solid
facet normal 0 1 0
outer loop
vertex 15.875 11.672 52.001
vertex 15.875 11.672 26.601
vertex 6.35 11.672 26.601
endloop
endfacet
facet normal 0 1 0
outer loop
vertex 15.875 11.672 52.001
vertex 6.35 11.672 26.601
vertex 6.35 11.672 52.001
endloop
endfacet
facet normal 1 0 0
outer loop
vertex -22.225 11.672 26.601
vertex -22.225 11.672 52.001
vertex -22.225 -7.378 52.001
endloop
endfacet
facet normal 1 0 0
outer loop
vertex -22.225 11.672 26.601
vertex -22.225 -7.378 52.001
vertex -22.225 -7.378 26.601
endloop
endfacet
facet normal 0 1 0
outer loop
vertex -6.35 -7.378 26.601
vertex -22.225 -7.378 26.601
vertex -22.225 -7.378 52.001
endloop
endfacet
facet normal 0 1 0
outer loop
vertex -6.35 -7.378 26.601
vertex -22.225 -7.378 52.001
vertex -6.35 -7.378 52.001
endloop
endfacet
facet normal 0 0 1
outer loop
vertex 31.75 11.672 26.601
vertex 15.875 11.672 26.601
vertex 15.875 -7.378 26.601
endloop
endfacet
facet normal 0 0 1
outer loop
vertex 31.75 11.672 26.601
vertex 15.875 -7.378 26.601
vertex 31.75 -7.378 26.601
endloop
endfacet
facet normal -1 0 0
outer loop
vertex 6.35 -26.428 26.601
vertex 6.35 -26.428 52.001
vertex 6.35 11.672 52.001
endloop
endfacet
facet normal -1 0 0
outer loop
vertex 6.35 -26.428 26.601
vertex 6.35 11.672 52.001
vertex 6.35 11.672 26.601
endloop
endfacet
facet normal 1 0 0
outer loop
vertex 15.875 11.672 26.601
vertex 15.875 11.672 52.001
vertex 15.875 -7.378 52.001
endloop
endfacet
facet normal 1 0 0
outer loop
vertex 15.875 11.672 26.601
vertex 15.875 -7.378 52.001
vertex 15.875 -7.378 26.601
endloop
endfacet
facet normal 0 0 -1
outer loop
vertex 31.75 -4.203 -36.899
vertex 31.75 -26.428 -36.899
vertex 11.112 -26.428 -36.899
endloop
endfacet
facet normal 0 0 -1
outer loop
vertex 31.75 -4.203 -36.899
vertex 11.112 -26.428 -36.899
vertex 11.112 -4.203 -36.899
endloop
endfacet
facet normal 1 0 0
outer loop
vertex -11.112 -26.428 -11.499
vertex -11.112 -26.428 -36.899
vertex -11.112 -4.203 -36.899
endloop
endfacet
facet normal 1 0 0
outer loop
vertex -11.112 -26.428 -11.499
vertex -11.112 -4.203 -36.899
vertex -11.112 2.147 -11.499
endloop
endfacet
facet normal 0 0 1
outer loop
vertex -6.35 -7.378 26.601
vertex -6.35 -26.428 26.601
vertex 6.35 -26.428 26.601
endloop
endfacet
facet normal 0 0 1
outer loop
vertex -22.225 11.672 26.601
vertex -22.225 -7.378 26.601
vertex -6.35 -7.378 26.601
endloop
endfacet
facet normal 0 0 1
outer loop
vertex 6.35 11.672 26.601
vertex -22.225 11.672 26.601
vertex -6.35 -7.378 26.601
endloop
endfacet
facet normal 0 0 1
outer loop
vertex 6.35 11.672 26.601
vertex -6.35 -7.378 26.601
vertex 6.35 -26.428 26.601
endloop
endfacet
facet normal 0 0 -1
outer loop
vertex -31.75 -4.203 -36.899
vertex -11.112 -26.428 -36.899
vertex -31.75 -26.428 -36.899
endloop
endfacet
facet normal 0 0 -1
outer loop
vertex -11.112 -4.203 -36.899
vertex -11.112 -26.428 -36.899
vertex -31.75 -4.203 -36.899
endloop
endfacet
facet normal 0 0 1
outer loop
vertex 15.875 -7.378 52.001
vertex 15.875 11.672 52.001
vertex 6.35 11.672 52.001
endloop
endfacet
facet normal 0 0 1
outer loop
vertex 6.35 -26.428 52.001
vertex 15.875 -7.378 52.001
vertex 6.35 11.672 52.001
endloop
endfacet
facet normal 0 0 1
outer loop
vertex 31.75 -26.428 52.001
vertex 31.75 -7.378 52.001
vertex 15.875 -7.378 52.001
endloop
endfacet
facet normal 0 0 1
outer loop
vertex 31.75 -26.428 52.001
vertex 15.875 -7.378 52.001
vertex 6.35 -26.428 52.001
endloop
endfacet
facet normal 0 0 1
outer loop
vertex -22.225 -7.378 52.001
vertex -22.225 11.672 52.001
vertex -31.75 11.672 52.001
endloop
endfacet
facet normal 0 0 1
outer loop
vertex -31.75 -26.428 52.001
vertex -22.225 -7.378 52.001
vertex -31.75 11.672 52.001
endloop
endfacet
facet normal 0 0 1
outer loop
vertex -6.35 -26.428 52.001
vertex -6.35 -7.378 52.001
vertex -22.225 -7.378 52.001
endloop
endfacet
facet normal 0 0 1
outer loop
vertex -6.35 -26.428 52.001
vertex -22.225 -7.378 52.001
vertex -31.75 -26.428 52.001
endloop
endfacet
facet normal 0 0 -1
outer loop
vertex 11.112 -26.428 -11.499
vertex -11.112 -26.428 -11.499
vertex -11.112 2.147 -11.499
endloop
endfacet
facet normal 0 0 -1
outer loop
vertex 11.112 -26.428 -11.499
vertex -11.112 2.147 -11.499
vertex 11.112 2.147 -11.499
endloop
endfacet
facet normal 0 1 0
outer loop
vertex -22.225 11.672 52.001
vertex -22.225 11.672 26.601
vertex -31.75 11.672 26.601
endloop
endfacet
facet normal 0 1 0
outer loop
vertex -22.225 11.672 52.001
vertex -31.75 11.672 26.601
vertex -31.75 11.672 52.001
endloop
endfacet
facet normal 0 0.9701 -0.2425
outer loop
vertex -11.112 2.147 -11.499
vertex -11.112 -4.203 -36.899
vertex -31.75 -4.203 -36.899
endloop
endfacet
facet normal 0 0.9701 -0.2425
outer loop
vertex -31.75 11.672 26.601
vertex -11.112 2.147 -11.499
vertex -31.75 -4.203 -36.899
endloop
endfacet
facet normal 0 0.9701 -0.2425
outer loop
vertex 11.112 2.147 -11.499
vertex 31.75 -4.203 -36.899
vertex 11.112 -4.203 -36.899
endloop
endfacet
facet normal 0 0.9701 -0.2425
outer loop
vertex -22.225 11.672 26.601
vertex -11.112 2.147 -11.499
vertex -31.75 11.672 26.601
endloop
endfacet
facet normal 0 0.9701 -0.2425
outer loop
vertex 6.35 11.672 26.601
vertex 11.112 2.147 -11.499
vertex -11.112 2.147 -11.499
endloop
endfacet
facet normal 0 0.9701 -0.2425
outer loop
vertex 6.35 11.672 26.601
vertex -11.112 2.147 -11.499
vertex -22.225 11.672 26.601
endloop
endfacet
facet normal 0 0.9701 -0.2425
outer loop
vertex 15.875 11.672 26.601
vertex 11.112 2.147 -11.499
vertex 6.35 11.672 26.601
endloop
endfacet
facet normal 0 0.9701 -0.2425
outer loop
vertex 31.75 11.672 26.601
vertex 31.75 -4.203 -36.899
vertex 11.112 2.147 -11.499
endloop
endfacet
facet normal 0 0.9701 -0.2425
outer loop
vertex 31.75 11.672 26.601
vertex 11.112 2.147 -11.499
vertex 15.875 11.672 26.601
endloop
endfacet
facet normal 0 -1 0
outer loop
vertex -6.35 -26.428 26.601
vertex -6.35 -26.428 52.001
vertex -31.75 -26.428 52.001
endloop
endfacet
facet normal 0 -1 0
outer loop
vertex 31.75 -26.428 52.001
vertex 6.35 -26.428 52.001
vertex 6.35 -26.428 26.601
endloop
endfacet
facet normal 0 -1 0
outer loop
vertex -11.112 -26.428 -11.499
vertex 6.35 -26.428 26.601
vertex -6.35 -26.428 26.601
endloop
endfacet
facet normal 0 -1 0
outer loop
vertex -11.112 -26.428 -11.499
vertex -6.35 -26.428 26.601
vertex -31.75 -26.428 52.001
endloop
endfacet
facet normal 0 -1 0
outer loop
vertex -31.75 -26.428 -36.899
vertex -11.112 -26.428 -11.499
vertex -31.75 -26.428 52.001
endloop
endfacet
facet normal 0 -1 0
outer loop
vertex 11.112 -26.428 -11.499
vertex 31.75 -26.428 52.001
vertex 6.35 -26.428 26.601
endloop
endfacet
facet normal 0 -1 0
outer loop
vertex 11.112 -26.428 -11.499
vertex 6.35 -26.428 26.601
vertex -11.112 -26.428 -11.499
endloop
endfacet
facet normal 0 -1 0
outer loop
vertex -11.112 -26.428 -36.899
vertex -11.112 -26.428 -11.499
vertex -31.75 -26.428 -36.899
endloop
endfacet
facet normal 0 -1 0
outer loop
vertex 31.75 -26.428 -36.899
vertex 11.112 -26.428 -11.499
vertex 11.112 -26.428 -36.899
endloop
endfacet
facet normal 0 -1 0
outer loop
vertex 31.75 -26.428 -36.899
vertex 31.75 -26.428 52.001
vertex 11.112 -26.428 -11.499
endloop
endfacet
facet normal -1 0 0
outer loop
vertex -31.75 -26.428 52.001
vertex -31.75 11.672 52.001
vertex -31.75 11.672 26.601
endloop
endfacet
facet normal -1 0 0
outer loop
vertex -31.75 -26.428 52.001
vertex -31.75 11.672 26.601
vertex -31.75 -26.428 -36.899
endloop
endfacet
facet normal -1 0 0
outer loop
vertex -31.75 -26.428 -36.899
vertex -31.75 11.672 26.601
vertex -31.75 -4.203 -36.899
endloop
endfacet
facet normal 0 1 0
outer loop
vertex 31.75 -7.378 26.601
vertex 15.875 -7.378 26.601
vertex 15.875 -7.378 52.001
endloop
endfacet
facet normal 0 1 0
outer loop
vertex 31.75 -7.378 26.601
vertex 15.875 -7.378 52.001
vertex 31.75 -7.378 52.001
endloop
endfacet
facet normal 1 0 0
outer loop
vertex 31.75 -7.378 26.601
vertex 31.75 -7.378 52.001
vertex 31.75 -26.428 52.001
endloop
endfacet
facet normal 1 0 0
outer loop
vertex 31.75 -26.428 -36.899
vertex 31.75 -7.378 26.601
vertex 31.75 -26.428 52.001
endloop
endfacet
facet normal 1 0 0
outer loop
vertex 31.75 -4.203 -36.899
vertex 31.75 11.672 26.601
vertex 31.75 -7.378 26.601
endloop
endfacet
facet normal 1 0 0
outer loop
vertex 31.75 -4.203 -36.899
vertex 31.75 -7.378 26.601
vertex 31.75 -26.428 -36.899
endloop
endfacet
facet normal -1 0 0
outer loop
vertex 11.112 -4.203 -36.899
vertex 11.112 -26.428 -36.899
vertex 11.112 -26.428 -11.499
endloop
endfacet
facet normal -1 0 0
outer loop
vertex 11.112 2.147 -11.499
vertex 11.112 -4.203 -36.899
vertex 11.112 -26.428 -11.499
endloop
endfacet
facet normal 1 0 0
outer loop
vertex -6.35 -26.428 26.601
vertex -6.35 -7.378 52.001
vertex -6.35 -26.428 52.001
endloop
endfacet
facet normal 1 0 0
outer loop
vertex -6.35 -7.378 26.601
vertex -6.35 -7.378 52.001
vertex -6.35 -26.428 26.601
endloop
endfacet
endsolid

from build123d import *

# Parameters (mm, degrees)
BOSS_EXTRUDE1_DEPTH = 31.75
SKETCH2_W           = 12.7
SKETCH2_H           = 25.4
CUT_EXTRUDE1_DEPTH  = 63.5
SKETCH3_W           = 15.875
SKETCH3_H           = 25.4
CUT_EXTRUDE2_DEPTH  = 19.05
SKETCH4_W           = 22.225
SKETCH4_H           = 25.4
CUT_EXTRUDE3_DEPTH  = 39.1


with BuildPart() as part:
    # Sketch1 → Boss-Extrude1 (new body, symmetric)
    with BuildSketch(Plane(origin=(0, 0, 0), x_dir=(0, 0, -1), z_dir=(1, 0, 0))):
        Polygon((-52.000801282, -26.427804487), (36.899198718, -26.427804487), (36.899198718, -4.202804487), (-26.600801282, 11.672195513), (-52.000801282, 11.672195513), align=None)
    extrude(amount=BOSS_EXTRUDE1_DEPTH, both=True)

    # Sketch2 → Cut-Extrude1 (cut)
    with BuildSketch(Plane(origin=(0, 11.672195513, 0), x_dir=(1, 0, 0), z_dir=(0, 1, 0))):
        with Locations((0, -39.300801282)):
            Rectangle(SKETCH2_W, SKETCH2_H)
    extrude(amount=-CUT_EXTRUDE1_DEPTH, mode=Mode.SUBTRACT)

    # Sketch3 → Cut-Extrude2 (cut)
    with BuildSketch(Plane(origin=(0, 11.672195513, 0), x_dir=(1, 0, 0), z_dir=(0, 1, 0))):
        with Locations((23.8125, -39.300801282)):
            Rectangle(SKETCH3_W, SKETCH3_H)
        with Locations((-14.2875, -39.300801282)):
            Rectangle(SKETCH3_W, SKETCH3_H)
    extrude(amount=-CUT_EXTRUDE2_DEPTH, mode=Mode.SUBTRACT)

    # Sketch4 → Cut-Extrude3 (cut, through all)
    with BuildSketch(Plane.XZ.offset(26.427804487)):
        with Locations((0, -24.199198718)):
            Rectangle(SKETCH4_W, SKETCH4_H)
    extrude(amount=-CUT_EXTRUDE3_DEPTH, mode=Mode.SUBTRACT)


solid = part.part
